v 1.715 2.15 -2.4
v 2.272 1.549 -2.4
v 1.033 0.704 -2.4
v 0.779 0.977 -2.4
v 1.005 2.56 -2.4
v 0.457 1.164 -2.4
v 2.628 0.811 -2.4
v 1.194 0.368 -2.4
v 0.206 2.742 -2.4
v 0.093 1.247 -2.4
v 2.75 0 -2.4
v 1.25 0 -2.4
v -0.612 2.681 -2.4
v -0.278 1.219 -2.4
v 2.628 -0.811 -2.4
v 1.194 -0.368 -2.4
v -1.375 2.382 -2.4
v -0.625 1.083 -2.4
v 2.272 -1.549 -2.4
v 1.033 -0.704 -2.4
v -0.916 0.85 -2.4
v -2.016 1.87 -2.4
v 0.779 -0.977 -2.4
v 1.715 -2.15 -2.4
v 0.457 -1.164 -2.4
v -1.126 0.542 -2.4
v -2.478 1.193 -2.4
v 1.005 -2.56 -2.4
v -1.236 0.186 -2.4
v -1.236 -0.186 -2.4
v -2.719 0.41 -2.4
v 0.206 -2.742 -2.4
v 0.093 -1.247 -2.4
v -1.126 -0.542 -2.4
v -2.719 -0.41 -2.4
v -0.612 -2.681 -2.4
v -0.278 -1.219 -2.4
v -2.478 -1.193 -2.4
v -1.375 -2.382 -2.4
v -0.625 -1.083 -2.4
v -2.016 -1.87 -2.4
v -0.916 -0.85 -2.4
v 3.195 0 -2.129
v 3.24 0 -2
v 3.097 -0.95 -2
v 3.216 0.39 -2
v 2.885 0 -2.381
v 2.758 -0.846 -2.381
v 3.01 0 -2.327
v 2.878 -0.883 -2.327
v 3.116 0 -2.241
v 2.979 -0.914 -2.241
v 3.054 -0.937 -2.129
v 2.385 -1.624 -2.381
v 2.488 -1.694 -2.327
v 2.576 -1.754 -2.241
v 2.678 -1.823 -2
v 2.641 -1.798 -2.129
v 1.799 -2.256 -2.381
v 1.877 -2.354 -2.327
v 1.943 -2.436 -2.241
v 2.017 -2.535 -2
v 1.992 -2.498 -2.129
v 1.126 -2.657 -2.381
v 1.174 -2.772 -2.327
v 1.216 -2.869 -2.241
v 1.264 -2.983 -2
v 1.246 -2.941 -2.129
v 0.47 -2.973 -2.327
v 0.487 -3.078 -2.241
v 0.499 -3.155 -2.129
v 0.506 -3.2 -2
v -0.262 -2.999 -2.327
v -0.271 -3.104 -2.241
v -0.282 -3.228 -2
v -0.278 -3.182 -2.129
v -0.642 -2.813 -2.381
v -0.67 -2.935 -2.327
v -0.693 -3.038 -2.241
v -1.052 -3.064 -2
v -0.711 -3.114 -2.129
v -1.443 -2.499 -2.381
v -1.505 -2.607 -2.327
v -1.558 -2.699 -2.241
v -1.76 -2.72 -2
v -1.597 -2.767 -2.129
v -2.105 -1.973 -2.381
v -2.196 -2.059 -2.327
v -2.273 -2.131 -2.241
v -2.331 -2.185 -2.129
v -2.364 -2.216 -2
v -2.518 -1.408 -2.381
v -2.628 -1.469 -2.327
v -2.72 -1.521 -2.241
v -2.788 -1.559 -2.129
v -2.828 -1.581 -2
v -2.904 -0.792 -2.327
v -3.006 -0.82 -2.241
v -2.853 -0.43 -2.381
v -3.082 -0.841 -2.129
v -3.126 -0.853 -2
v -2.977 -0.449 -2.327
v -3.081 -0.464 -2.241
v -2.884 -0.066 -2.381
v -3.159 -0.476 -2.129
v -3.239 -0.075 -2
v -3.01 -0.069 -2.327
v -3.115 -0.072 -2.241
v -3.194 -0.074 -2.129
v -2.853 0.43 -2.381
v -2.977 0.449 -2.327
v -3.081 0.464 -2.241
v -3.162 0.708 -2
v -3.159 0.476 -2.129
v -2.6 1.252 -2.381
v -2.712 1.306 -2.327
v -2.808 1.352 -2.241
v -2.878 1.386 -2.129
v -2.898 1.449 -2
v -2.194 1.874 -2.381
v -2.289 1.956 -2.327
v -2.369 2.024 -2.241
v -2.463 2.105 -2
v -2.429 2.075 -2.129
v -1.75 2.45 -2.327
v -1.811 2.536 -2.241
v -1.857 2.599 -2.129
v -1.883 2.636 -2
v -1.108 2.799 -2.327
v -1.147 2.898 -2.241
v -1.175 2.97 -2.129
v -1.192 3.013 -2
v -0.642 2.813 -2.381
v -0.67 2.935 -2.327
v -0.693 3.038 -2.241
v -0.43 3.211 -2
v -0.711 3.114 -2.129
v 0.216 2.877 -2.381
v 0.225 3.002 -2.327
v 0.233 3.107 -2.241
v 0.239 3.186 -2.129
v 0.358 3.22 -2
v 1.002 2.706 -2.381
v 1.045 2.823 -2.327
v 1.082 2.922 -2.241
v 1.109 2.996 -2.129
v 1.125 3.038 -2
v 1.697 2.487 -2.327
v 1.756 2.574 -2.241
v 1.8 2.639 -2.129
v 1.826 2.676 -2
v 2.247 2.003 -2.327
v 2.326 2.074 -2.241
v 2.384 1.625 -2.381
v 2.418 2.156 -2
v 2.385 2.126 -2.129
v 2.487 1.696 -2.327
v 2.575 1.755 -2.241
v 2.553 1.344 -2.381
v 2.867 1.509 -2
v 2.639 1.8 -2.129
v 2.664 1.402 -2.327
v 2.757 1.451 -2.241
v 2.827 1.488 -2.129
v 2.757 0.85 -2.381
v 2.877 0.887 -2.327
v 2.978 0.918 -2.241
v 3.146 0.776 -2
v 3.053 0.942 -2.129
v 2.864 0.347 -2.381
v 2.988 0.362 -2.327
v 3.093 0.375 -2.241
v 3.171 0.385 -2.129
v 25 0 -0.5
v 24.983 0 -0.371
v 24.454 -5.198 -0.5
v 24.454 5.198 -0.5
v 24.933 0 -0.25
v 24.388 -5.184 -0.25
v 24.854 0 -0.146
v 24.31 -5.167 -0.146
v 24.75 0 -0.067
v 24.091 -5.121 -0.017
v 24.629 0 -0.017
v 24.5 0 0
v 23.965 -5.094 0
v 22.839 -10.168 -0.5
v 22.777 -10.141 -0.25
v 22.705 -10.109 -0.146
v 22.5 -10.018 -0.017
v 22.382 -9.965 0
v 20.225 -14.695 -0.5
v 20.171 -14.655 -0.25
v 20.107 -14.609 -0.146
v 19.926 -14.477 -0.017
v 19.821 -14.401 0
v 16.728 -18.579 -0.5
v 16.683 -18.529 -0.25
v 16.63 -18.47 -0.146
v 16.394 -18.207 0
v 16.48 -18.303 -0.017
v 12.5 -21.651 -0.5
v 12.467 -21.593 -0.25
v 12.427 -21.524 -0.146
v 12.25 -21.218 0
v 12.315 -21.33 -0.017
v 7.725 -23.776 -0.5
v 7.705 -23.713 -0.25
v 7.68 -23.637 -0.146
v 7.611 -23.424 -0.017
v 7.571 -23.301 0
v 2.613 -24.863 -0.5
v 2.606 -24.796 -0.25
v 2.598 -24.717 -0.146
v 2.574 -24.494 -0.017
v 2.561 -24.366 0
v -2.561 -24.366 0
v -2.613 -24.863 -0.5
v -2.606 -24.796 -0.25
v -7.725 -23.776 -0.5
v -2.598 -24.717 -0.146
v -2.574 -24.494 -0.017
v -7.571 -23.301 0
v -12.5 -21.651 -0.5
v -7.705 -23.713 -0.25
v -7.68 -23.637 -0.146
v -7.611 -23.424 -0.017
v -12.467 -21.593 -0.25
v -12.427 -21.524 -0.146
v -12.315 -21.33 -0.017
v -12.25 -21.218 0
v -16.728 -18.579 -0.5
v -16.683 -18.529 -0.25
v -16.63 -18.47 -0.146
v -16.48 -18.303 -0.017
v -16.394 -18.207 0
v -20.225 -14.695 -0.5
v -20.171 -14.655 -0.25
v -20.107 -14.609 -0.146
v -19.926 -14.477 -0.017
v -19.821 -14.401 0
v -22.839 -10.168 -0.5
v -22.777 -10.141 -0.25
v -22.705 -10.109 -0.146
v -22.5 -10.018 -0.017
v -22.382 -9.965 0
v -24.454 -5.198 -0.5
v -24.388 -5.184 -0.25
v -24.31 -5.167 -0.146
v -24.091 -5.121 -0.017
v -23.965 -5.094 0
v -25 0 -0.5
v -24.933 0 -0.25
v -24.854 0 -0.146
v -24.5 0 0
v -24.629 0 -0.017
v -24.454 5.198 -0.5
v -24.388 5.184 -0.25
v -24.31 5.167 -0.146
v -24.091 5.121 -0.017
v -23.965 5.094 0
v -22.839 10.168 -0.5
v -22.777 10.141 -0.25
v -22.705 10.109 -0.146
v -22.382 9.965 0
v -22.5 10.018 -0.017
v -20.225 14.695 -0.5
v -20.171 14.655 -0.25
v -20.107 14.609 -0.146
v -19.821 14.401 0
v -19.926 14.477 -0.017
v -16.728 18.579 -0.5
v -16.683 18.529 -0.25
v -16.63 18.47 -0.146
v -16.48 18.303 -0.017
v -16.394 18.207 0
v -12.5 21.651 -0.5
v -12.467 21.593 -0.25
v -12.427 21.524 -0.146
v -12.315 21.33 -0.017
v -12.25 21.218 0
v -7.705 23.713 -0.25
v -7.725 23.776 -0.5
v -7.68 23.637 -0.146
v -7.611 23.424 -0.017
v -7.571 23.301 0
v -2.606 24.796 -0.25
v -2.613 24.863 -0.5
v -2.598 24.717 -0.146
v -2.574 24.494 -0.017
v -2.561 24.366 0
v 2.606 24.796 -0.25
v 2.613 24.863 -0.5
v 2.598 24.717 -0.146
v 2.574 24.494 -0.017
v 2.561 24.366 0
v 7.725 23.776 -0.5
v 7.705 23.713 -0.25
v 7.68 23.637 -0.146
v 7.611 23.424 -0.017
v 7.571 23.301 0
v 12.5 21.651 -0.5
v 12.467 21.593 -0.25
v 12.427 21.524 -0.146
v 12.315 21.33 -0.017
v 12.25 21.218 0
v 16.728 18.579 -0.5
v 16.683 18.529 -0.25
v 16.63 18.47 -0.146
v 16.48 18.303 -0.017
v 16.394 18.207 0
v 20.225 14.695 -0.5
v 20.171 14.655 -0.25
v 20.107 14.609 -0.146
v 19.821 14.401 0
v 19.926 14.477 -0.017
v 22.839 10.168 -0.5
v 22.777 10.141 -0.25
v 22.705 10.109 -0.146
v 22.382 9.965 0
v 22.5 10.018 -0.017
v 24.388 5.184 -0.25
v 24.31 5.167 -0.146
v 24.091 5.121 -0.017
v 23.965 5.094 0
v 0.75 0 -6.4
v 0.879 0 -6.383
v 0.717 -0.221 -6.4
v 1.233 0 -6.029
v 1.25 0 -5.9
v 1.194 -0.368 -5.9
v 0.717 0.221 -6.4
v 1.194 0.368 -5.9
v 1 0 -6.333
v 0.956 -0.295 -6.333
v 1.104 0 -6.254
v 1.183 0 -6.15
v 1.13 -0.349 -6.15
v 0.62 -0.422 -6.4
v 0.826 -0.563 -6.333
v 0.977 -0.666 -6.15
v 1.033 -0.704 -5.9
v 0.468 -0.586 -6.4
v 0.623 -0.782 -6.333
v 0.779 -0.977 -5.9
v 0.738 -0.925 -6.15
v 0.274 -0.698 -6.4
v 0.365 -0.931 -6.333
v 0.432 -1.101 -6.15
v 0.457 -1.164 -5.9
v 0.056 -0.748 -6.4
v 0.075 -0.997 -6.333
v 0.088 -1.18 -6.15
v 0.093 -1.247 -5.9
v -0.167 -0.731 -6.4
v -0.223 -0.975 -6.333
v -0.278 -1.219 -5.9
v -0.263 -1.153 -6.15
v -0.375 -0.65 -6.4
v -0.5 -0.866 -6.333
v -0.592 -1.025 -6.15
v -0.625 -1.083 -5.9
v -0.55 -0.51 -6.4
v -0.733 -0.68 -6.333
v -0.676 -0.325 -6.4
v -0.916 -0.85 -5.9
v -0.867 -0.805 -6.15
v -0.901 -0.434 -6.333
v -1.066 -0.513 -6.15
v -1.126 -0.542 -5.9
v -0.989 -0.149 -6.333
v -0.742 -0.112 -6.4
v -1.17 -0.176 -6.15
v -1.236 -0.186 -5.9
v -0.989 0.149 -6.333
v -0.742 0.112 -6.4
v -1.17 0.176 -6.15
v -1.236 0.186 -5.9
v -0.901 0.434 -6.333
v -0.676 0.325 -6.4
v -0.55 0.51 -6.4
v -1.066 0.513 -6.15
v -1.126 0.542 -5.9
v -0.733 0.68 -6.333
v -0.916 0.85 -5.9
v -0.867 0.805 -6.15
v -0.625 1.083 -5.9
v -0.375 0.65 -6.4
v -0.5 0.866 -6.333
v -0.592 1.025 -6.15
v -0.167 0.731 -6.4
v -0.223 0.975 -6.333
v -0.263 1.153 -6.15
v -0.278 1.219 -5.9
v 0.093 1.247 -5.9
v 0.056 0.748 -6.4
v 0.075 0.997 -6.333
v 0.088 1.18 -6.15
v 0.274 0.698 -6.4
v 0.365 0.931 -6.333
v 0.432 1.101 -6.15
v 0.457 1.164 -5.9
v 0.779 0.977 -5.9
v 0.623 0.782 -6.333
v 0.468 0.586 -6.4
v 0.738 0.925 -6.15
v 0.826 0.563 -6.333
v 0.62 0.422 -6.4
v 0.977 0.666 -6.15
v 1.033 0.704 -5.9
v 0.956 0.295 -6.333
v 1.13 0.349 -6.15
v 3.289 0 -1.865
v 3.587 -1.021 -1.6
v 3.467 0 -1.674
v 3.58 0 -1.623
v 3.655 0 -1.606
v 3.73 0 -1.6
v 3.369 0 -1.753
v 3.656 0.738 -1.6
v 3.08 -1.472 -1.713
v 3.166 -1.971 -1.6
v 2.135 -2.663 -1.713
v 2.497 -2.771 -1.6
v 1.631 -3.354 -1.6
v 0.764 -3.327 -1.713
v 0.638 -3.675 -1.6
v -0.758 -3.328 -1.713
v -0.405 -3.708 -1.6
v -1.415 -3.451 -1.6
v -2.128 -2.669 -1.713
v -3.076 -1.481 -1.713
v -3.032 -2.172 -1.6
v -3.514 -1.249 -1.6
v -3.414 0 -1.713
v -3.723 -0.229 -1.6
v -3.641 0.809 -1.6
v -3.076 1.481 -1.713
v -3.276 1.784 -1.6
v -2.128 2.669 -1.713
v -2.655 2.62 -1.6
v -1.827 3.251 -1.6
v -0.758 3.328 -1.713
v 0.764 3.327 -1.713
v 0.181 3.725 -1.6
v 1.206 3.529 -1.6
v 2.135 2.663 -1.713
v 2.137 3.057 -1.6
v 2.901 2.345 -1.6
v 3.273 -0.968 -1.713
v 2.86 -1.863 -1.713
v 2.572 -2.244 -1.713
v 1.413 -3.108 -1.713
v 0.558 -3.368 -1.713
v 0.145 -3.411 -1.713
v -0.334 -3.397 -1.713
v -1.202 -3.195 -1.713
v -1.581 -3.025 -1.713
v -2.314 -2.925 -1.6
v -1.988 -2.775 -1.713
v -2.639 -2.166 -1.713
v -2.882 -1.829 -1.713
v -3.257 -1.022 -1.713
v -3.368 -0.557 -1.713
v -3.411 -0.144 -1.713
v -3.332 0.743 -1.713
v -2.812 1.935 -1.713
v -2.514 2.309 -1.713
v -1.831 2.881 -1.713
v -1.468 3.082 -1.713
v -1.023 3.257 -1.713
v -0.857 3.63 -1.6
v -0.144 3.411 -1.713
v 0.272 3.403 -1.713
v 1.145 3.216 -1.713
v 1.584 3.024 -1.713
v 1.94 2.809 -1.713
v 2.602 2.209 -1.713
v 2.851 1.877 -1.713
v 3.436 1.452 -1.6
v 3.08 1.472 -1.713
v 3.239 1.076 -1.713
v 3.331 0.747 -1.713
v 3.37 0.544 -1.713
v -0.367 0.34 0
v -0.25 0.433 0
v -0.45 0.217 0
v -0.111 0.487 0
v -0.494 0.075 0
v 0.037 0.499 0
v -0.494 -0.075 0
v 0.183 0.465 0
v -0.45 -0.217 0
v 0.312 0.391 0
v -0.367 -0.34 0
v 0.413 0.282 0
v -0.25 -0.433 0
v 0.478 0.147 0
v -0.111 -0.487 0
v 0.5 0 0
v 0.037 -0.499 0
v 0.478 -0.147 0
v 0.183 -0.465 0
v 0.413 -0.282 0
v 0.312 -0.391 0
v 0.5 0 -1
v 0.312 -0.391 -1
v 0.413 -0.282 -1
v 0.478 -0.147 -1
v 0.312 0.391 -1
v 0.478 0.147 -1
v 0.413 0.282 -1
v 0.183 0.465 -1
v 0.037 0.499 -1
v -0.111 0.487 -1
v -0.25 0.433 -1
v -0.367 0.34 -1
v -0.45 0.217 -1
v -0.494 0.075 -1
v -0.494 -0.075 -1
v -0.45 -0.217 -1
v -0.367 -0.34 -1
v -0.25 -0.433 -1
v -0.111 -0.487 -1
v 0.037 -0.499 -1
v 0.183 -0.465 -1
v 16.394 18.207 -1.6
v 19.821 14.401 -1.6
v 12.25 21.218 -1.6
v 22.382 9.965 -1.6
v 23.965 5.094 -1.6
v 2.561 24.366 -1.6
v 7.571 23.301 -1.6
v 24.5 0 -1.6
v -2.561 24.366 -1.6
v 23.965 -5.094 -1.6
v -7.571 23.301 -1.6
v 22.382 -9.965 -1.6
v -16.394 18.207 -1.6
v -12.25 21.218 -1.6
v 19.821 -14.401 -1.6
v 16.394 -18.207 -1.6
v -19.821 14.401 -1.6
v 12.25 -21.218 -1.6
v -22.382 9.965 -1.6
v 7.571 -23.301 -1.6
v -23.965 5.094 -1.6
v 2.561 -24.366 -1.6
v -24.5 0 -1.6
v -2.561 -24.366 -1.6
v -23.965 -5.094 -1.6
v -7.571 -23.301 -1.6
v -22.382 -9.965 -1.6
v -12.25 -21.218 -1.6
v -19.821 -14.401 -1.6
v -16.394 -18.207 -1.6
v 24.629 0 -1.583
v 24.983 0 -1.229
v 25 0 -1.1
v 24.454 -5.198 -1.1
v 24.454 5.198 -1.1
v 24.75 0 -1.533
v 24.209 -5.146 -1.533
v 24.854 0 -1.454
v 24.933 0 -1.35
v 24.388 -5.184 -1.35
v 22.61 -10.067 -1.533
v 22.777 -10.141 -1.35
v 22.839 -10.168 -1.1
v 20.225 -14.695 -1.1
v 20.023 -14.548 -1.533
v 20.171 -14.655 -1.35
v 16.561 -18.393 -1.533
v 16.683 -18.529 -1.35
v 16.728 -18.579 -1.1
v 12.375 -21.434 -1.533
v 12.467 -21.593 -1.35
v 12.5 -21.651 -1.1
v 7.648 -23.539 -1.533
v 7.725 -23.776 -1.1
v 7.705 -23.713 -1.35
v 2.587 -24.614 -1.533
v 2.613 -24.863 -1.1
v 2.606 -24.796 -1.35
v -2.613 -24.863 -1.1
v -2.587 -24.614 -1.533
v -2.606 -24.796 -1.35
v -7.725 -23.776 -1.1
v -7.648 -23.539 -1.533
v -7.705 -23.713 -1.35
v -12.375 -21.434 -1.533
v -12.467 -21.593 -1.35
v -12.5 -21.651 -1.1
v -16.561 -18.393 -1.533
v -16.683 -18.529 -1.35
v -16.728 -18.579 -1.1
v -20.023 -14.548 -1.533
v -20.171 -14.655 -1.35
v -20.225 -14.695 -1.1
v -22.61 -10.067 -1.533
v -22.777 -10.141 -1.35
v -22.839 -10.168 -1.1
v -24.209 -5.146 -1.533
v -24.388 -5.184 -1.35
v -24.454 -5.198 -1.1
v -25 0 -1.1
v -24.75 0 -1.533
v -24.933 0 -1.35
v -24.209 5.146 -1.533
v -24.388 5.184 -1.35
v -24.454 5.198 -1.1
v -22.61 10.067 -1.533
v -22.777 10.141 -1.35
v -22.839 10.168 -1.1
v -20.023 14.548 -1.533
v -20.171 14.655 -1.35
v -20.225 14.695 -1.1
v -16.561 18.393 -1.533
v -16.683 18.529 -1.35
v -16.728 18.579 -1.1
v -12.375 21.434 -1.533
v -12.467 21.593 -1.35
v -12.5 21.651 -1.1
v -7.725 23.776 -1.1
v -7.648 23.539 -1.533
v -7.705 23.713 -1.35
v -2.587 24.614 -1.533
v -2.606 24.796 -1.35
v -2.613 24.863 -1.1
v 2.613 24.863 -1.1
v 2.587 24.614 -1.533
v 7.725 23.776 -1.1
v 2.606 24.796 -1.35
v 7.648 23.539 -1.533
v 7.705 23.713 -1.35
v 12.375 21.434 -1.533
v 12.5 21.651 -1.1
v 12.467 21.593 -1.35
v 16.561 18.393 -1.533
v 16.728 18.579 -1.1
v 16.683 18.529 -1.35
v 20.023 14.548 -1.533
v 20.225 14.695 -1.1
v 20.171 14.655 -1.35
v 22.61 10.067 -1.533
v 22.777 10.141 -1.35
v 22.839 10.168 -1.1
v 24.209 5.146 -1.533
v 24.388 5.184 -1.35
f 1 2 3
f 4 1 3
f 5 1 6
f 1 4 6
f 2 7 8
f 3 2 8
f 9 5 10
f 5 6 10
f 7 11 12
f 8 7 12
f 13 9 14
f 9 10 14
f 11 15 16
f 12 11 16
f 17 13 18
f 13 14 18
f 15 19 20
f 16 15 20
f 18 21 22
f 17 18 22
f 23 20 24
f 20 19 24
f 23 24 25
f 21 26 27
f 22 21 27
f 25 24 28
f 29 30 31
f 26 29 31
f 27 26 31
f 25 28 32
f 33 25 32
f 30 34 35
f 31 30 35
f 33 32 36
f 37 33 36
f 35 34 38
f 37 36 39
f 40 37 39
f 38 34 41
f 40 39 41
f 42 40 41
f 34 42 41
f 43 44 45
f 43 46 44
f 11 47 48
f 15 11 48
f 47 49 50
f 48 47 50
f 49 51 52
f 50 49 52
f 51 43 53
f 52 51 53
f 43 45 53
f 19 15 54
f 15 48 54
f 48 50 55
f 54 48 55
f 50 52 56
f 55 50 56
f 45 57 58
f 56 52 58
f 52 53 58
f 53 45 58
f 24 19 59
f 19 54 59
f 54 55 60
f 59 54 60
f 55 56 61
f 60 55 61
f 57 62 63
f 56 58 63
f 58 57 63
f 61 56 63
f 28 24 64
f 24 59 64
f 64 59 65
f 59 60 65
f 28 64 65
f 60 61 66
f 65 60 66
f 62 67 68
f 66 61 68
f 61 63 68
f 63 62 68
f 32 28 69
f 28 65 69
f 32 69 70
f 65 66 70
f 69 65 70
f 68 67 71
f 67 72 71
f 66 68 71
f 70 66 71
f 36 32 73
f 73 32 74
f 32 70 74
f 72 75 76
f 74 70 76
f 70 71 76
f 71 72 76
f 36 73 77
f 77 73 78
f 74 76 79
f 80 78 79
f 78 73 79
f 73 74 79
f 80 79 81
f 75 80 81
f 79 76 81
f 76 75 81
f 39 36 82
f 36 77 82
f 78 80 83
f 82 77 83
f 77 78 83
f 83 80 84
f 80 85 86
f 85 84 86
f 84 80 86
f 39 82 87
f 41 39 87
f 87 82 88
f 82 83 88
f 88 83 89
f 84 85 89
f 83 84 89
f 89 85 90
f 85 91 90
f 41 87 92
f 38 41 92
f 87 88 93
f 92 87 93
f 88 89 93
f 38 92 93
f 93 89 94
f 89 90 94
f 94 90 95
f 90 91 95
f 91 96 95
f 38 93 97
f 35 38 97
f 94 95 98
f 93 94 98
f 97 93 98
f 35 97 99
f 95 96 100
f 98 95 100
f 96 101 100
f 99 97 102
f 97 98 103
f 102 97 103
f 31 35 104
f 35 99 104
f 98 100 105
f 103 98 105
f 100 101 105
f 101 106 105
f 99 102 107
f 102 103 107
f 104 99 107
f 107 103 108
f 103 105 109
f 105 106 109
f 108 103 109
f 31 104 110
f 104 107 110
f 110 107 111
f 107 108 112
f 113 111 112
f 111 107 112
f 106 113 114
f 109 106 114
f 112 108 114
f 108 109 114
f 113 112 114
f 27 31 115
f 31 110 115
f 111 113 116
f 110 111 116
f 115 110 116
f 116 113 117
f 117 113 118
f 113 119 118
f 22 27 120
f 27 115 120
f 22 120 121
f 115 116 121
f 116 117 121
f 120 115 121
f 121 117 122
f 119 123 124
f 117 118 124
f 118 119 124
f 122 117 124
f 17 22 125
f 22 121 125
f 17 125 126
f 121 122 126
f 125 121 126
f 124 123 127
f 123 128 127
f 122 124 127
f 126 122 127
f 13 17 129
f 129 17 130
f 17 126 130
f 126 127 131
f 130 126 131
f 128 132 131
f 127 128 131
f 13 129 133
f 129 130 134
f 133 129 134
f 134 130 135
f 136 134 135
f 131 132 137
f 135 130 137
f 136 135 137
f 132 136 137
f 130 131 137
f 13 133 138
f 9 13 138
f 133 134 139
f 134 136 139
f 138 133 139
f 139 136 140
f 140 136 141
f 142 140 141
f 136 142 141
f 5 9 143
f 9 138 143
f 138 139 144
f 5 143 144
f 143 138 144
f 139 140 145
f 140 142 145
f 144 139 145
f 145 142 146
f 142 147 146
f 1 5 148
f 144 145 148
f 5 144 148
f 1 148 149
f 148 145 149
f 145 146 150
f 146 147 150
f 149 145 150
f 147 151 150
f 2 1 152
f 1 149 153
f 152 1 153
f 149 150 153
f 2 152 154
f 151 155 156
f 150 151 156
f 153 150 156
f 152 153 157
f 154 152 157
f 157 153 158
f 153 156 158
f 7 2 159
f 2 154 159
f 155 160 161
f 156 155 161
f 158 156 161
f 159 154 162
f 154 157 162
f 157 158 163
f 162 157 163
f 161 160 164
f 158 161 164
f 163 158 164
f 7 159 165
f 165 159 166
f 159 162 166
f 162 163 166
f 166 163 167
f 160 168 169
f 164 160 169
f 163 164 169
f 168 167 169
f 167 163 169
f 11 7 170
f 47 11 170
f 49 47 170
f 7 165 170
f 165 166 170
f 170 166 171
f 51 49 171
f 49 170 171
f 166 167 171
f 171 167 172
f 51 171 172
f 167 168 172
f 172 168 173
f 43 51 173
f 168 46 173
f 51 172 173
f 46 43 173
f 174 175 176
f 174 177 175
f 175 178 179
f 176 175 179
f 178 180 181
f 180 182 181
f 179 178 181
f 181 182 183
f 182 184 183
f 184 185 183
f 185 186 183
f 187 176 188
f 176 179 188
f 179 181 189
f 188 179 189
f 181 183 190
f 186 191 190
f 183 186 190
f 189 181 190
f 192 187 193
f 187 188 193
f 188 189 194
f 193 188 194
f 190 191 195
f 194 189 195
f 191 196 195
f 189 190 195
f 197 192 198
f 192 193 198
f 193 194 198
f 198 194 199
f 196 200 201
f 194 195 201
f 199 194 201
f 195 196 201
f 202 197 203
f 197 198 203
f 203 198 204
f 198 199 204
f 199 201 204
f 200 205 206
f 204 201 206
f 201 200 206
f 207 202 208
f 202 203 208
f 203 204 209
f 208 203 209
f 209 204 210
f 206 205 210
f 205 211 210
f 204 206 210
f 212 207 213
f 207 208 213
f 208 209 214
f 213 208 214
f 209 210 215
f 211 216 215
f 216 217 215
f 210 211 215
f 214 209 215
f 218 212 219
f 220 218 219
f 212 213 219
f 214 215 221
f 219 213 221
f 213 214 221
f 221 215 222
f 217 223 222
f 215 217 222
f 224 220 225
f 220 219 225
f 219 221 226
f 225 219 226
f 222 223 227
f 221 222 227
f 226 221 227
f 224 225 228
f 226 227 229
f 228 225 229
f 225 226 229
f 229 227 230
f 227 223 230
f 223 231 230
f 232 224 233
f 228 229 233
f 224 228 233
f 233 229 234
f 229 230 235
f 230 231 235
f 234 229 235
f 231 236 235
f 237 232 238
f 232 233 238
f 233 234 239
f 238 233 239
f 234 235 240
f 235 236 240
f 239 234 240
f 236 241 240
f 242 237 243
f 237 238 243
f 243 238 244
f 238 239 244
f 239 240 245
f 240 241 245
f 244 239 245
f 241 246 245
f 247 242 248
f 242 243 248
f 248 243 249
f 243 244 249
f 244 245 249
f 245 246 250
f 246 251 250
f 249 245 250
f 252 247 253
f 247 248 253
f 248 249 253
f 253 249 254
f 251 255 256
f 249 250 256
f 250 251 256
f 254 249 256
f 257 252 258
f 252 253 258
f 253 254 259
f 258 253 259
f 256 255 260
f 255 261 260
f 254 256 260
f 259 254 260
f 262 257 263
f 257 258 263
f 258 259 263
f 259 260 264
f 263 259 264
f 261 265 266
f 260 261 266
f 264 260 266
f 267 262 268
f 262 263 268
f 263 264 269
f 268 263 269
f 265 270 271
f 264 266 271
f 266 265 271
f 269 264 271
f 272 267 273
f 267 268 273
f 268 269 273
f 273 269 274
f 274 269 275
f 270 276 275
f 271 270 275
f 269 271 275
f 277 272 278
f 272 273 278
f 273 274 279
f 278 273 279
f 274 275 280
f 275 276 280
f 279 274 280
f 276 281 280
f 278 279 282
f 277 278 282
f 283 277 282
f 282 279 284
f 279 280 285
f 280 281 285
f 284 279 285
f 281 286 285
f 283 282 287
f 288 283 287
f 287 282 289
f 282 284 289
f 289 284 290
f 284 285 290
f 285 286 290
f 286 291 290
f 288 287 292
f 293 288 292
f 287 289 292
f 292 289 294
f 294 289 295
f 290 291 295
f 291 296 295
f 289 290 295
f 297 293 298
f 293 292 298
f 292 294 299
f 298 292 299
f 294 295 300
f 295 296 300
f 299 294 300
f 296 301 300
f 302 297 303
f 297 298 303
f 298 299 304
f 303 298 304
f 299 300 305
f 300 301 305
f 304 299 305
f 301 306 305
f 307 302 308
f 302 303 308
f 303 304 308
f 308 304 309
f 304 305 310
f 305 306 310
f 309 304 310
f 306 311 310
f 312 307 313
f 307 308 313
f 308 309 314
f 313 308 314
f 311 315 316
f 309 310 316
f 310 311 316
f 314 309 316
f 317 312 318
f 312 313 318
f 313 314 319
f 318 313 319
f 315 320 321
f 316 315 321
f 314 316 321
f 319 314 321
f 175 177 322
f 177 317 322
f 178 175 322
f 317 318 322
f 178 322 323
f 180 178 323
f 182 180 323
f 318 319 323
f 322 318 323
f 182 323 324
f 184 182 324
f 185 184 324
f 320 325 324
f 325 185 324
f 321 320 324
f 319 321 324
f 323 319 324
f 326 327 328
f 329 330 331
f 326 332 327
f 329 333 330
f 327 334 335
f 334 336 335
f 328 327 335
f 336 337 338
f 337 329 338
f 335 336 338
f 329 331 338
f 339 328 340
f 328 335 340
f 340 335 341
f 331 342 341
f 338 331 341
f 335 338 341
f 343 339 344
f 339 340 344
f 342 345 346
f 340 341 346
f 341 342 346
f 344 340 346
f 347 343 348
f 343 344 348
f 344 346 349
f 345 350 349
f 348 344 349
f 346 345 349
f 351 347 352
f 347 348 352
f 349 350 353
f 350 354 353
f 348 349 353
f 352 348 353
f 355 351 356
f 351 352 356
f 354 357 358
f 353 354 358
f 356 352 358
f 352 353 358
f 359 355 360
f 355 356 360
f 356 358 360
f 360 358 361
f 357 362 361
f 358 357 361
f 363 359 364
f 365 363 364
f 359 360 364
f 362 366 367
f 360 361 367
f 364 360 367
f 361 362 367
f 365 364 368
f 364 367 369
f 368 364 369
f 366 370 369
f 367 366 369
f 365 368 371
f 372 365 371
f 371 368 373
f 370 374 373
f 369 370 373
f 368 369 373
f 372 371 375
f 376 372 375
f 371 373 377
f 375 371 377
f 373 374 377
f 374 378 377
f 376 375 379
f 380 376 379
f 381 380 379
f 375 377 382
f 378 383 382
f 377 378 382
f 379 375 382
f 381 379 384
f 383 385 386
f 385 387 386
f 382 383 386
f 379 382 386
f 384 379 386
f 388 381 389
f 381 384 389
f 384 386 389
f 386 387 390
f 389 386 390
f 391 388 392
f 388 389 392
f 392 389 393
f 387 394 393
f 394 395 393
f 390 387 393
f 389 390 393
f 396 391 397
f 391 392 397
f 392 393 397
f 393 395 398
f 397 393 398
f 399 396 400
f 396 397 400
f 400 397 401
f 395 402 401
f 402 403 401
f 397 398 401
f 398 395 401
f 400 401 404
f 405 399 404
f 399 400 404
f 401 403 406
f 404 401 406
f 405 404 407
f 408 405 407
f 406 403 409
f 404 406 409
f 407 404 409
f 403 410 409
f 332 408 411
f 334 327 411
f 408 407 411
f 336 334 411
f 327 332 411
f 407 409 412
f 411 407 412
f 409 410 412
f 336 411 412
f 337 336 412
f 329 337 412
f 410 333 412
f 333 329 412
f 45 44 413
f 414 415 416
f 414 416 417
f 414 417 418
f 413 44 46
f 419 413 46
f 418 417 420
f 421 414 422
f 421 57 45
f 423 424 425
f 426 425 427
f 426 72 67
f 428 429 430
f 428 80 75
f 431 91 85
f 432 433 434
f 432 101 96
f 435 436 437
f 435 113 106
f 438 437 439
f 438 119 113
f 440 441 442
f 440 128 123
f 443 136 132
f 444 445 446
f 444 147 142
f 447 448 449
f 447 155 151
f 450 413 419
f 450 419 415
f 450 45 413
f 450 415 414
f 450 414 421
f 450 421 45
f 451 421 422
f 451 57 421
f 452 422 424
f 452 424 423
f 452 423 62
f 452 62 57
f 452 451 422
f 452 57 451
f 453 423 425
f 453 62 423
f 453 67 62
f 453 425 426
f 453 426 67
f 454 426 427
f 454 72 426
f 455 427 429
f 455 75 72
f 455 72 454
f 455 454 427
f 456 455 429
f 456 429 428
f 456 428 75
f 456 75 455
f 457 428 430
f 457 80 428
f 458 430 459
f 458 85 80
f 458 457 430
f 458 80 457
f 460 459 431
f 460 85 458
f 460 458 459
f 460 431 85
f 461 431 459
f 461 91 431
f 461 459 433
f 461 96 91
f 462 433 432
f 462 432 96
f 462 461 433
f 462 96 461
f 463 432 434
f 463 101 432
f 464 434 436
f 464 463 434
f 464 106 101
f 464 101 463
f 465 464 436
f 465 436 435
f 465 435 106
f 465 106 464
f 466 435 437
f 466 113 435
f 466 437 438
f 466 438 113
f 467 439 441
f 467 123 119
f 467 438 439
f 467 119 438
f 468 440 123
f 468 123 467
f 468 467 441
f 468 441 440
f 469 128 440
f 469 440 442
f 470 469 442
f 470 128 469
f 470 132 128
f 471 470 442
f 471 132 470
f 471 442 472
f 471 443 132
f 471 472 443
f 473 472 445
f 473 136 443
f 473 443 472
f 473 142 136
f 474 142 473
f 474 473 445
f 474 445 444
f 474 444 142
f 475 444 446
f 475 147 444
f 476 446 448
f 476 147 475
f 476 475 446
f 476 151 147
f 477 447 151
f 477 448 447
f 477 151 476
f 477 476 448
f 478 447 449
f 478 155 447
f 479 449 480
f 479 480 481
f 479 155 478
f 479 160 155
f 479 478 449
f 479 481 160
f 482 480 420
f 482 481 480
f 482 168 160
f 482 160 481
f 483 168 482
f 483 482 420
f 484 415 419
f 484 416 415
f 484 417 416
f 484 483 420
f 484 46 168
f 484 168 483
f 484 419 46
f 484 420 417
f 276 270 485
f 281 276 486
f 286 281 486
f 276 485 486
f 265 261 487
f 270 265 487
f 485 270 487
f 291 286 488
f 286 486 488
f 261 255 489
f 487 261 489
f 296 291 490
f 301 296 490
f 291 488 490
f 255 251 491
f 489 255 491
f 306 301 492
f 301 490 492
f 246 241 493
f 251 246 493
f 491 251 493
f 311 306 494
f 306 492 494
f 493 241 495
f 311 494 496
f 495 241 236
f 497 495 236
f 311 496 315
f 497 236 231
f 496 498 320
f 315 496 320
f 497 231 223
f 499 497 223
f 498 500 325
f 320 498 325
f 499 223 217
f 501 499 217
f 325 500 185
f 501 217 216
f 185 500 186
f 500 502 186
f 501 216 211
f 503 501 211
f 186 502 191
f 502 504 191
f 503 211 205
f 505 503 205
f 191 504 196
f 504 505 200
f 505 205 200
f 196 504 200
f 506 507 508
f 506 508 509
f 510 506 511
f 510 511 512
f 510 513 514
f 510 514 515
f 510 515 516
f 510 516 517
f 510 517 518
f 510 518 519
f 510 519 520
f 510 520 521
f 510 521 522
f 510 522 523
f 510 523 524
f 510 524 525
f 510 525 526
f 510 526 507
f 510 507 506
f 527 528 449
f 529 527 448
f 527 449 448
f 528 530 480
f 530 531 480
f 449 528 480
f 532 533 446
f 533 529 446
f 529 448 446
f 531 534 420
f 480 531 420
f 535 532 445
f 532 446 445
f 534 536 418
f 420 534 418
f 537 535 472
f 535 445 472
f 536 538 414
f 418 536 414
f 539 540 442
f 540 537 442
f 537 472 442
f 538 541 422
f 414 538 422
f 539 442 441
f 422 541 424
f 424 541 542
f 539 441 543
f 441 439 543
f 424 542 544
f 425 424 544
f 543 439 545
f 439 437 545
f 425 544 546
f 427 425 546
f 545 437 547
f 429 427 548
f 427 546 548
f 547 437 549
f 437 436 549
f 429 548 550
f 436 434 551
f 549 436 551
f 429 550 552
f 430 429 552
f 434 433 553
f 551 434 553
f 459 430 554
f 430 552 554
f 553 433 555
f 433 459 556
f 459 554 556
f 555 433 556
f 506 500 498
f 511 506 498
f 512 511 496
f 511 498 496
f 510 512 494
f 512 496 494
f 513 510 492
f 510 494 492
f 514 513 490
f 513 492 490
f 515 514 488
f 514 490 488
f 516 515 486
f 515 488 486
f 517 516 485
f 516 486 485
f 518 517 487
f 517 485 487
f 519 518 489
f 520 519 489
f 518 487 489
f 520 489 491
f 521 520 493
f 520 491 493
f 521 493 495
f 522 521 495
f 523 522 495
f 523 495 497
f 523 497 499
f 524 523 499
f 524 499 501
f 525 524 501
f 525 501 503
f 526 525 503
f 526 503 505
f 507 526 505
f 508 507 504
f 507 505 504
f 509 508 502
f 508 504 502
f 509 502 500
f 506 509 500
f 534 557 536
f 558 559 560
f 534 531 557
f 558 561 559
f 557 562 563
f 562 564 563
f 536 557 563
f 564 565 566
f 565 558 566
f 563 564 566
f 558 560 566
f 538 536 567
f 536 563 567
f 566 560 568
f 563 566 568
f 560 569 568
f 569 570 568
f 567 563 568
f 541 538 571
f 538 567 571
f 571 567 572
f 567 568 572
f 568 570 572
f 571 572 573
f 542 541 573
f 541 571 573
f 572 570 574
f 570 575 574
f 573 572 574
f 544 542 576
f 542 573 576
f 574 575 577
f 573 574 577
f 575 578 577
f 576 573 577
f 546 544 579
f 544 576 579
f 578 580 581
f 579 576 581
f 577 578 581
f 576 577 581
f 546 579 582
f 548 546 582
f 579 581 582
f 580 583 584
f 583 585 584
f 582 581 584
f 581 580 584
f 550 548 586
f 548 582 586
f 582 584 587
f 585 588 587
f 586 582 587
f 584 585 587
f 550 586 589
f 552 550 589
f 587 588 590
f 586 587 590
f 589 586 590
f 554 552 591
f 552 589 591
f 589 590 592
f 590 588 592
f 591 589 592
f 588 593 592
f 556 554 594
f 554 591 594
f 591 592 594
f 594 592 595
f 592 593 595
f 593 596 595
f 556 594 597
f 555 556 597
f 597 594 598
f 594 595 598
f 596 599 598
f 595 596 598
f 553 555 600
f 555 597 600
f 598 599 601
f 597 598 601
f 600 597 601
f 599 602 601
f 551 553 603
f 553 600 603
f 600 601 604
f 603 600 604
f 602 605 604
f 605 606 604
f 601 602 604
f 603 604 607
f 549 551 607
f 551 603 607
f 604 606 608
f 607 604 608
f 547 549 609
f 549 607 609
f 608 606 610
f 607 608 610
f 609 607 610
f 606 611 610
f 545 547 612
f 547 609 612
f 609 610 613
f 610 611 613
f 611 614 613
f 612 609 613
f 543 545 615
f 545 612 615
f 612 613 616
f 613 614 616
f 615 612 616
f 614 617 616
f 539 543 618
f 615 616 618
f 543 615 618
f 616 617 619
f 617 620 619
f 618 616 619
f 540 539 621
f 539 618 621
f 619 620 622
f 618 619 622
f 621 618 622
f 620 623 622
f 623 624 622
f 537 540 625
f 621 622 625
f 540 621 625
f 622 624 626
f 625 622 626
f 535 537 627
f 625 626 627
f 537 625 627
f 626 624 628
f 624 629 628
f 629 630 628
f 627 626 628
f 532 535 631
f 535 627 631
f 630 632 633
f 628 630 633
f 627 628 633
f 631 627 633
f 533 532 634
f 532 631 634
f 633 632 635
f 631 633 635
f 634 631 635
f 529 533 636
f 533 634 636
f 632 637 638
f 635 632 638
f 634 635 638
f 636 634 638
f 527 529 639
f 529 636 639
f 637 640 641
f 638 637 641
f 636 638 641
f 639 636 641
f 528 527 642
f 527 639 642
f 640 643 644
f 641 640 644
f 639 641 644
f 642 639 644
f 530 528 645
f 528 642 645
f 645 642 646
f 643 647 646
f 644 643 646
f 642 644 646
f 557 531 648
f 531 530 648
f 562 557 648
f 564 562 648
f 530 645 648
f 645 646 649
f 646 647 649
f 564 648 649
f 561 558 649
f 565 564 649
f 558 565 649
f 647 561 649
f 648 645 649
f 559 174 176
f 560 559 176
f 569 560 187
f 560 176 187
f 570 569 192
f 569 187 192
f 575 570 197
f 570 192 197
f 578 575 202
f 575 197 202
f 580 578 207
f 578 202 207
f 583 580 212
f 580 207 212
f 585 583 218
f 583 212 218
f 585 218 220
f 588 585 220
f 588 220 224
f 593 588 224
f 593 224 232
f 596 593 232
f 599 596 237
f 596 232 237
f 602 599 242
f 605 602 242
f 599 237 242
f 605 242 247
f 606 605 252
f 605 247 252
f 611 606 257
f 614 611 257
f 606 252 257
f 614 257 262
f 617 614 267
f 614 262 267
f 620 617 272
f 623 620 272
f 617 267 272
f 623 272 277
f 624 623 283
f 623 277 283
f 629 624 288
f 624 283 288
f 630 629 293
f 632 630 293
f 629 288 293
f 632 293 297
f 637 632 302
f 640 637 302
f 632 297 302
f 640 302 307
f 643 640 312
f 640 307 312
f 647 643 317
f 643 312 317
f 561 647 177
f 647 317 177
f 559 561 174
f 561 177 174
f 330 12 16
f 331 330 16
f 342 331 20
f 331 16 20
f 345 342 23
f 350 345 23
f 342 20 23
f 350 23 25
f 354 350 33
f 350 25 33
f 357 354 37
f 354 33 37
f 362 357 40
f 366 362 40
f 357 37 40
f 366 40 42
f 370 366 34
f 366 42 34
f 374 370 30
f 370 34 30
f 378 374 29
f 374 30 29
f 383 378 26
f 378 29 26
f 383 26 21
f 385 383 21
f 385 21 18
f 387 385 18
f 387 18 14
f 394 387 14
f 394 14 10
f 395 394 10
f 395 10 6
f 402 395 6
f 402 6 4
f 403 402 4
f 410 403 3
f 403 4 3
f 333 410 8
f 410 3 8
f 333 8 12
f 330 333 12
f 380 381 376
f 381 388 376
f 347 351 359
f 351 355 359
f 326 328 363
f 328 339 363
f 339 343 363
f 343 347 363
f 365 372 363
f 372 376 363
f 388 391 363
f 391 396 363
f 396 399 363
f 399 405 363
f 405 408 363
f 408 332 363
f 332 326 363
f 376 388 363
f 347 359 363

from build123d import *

# Parameters (mm, degrees)
F2_R     = 0.5
F3_R     = 0.5
F4_R     = 0.5
F5_R     = 0.5
F6_R     = 0.5
F7_R     = 0.5
F8_DEPTH = 1


with BuildPart() as f1:
    # F0 (on Front) → F1 (revolve)
    with BuildSketch(Plane.XZ):
        Polygon((25, 0), (0, 0), (0, -6.4), (1.25, -6.4), (1.25, -2.4), (3.25, -2.4), (3.25, -1.6), (25, -1.6), align=None)
    revolve(axis=Axis((0, 0, 0.442708), (0, 0, -1)))

    # F2
    f2_edges = [f1.edges().sort_by_distance(p)[0] for p in [
        (-1.25, 0, -6.4),
    ]]
    fillet(f2_edges, radius=F2_R)

    # F3
    f3_edges = [f1.edges().sort_by_distance(p)[0] for p in [
        (-3.25, 0, -2.4),
    ]]
    fillet(f3_edges, radius=F3_R)

    # F4
    f4_edges = [f1.edges().sort_by_distance(p)[0] for p in [
        (-3.25, 0, -1.6),
    ]]
    fillet(f4_edges, radius=F4_R)

    # F5
    f5_edges = [f1.edges().sort_by_distance(p)[0] for p in [
        (-25, 0, -1.6),
    ]]
    fillet(f5_edges, radius=F5_R)

    # F6
    f6_edges = [f1.edges().sort_by_distance(p)[0] for p in [
        (-25, 0, 0),
    ]]
    fillet(f6_edges, radius=F6_R)

    # F7 (on face) → F8 (cut)
    with BuildSketch(Plane.XY):
        Circle(F7_R)
    extrude(amount=-F8_DEPTH, mode=Mode.SUBTRACT)


solid = f1.part
